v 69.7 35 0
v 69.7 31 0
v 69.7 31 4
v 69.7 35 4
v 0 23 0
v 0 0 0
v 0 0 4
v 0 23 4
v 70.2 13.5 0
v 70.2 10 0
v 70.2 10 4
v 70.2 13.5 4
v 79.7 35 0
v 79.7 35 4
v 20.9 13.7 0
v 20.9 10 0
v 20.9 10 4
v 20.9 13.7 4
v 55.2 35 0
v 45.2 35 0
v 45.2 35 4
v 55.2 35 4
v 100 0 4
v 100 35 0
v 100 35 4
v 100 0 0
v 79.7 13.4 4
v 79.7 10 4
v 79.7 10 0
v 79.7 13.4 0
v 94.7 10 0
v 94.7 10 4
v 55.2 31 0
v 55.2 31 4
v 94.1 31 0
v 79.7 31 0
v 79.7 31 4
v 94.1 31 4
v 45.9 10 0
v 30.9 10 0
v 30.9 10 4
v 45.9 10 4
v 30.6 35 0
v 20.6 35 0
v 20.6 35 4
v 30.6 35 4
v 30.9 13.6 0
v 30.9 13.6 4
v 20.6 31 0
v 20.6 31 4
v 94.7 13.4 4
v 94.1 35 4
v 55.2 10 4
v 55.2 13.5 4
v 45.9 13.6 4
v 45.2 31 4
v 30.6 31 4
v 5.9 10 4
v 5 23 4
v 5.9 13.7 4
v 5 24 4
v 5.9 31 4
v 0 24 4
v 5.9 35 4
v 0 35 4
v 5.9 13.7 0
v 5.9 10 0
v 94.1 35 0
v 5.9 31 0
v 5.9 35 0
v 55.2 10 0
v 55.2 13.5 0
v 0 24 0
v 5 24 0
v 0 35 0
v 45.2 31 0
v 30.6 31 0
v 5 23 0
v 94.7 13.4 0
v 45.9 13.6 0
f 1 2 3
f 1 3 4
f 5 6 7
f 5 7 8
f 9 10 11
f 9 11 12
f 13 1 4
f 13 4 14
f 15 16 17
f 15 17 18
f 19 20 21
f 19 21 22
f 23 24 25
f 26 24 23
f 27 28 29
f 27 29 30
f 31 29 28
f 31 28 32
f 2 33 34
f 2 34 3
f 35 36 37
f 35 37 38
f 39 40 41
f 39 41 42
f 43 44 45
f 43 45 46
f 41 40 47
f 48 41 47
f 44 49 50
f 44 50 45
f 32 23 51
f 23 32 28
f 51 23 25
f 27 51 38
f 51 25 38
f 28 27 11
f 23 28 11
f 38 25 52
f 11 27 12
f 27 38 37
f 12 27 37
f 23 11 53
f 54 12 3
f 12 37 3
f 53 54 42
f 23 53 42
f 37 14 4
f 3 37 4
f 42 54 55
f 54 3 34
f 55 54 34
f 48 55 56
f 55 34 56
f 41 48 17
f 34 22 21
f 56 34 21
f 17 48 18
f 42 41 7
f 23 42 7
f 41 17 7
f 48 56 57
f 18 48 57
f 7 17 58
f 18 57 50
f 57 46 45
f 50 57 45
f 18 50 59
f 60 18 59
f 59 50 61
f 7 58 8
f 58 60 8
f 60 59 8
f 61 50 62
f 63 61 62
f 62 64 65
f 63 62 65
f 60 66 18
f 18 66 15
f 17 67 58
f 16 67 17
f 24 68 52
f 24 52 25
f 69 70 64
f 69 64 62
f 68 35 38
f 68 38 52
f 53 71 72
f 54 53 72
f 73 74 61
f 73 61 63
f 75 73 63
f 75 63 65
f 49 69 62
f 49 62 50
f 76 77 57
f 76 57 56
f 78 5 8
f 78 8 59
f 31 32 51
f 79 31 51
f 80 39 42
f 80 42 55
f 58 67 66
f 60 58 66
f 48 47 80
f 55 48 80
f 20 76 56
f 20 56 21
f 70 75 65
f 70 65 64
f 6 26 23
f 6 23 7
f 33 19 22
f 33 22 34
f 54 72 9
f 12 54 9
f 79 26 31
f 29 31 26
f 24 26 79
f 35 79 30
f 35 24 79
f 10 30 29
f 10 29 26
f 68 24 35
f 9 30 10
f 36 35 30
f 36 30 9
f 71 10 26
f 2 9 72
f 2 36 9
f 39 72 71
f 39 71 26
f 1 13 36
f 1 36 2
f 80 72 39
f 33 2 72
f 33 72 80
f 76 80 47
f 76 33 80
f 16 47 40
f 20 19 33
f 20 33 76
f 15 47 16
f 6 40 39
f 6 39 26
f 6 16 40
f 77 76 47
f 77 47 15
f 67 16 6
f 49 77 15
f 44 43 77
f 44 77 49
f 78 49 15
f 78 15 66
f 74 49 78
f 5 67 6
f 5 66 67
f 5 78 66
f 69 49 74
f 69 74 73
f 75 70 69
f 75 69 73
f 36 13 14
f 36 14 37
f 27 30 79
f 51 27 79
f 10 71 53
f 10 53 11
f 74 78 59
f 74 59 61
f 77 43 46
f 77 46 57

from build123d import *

# Parameters (mm, degrees)
SKIZZE1_W                       = 15
SKIZZE1_H                       = 3.7
SKIZZE1_H_2                     = 3.6
SKIZZE1_H_3                     = 3.5
SKIZZE1_H_4                     = 3.4
AUFSATZ_LINEAR_AUSTRAGEN1_DEPTH = 4


with BuildPart() as part:
    # Skizze1 → Aufsatz-Linear austragen1 (new body)
    with BuildSketch(Plane.XY):
        Polygon((5.9, 35), (5.9, 31), (20.6, 31), (20.6, 35), (30.6, 35), (30.6, 31), (45.2, 31), (45.2, 35), (55.2, 35), (55.2, 31), (69.7, 31), (69.7, 35), (79.7, 35), (79.7, 31), (94.1, 31), (94.1, 35), (100, 35), (100, 0), (0, 0), (0, 23), (5, 23), (5, 24), (0, 24), (0, 35), align=None)
        with Locations((13.4, 11.85)):
            Rectangle(SKIZZE1_W, SKIZZE1_H, mode=Mode.SUBTRACT)
        with Locations((38.4, 11.8)):
            Rectangle(SKIZZE1_W, SKIZZE1_H_2, mode=Mode.SUBTRACT)
        with Locations((62.7, 11.75)):
            Rectangle(SKIZZE1_W, SKIZZE1_H_3, mode=Mode.SUBTRACT)
        with Locations((87.2, 11.7)):
            Rectangle(SKIZZE1_W, SKIZZE1_H_4, mode=Mode.SUBTRACT)
    extrude(amount=AUFSATZ_LINEAR_AUSTRAGEN1_DEPTH)


solid = part.part
